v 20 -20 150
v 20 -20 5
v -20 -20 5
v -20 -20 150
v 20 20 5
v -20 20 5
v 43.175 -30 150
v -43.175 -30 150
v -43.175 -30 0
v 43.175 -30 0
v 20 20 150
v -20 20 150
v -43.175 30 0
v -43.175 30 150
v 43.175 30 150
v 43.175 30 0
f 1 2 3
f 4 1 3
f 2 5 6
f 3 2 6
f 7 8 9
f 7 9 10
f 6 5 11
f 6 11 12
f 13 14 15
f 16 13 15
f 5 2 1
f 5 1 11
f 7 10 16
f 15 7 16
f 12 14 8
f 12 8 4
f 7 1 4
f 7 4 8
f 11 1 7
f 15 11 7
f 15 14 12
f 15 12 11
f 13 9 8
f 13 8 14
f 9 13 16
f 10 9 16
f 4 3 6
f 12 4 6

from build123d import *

# Parameters (mm, degrees)
SKETCH1_W           = 86.35
SKETCH1_H           = 60
BOSS_EXTRUDE1_DEPTH = 150
SKETCH2_W           = 40
SKETCH2_H           = 40
CUT_EXTRUDE1_DEPTH  = 145


with BuildPart() as part:
    # Sketch1 → Boss-Extrude1 (new body)
    with BuildSketch(Plane.XY):
        Rectangle(SKETCH1_W, SKETCH1_H)
    extrude(amount=BOSS_EXTRUDE1_DEPTH)

    # Sketch2 → Cut-Extrude1 (cut)
    with BuildSketch(Plane(origin=(0, 0, 150), x_dir=(-1, 0, 0), z_dir=(0, 0, -1))):
        Rectangle(SKETCH2_W, SKETCH2_H)
    extrude(amount=CUT_EXTRUDE1_DEPTH, mode=Mode.SUBTRACT)


solid = part.part
